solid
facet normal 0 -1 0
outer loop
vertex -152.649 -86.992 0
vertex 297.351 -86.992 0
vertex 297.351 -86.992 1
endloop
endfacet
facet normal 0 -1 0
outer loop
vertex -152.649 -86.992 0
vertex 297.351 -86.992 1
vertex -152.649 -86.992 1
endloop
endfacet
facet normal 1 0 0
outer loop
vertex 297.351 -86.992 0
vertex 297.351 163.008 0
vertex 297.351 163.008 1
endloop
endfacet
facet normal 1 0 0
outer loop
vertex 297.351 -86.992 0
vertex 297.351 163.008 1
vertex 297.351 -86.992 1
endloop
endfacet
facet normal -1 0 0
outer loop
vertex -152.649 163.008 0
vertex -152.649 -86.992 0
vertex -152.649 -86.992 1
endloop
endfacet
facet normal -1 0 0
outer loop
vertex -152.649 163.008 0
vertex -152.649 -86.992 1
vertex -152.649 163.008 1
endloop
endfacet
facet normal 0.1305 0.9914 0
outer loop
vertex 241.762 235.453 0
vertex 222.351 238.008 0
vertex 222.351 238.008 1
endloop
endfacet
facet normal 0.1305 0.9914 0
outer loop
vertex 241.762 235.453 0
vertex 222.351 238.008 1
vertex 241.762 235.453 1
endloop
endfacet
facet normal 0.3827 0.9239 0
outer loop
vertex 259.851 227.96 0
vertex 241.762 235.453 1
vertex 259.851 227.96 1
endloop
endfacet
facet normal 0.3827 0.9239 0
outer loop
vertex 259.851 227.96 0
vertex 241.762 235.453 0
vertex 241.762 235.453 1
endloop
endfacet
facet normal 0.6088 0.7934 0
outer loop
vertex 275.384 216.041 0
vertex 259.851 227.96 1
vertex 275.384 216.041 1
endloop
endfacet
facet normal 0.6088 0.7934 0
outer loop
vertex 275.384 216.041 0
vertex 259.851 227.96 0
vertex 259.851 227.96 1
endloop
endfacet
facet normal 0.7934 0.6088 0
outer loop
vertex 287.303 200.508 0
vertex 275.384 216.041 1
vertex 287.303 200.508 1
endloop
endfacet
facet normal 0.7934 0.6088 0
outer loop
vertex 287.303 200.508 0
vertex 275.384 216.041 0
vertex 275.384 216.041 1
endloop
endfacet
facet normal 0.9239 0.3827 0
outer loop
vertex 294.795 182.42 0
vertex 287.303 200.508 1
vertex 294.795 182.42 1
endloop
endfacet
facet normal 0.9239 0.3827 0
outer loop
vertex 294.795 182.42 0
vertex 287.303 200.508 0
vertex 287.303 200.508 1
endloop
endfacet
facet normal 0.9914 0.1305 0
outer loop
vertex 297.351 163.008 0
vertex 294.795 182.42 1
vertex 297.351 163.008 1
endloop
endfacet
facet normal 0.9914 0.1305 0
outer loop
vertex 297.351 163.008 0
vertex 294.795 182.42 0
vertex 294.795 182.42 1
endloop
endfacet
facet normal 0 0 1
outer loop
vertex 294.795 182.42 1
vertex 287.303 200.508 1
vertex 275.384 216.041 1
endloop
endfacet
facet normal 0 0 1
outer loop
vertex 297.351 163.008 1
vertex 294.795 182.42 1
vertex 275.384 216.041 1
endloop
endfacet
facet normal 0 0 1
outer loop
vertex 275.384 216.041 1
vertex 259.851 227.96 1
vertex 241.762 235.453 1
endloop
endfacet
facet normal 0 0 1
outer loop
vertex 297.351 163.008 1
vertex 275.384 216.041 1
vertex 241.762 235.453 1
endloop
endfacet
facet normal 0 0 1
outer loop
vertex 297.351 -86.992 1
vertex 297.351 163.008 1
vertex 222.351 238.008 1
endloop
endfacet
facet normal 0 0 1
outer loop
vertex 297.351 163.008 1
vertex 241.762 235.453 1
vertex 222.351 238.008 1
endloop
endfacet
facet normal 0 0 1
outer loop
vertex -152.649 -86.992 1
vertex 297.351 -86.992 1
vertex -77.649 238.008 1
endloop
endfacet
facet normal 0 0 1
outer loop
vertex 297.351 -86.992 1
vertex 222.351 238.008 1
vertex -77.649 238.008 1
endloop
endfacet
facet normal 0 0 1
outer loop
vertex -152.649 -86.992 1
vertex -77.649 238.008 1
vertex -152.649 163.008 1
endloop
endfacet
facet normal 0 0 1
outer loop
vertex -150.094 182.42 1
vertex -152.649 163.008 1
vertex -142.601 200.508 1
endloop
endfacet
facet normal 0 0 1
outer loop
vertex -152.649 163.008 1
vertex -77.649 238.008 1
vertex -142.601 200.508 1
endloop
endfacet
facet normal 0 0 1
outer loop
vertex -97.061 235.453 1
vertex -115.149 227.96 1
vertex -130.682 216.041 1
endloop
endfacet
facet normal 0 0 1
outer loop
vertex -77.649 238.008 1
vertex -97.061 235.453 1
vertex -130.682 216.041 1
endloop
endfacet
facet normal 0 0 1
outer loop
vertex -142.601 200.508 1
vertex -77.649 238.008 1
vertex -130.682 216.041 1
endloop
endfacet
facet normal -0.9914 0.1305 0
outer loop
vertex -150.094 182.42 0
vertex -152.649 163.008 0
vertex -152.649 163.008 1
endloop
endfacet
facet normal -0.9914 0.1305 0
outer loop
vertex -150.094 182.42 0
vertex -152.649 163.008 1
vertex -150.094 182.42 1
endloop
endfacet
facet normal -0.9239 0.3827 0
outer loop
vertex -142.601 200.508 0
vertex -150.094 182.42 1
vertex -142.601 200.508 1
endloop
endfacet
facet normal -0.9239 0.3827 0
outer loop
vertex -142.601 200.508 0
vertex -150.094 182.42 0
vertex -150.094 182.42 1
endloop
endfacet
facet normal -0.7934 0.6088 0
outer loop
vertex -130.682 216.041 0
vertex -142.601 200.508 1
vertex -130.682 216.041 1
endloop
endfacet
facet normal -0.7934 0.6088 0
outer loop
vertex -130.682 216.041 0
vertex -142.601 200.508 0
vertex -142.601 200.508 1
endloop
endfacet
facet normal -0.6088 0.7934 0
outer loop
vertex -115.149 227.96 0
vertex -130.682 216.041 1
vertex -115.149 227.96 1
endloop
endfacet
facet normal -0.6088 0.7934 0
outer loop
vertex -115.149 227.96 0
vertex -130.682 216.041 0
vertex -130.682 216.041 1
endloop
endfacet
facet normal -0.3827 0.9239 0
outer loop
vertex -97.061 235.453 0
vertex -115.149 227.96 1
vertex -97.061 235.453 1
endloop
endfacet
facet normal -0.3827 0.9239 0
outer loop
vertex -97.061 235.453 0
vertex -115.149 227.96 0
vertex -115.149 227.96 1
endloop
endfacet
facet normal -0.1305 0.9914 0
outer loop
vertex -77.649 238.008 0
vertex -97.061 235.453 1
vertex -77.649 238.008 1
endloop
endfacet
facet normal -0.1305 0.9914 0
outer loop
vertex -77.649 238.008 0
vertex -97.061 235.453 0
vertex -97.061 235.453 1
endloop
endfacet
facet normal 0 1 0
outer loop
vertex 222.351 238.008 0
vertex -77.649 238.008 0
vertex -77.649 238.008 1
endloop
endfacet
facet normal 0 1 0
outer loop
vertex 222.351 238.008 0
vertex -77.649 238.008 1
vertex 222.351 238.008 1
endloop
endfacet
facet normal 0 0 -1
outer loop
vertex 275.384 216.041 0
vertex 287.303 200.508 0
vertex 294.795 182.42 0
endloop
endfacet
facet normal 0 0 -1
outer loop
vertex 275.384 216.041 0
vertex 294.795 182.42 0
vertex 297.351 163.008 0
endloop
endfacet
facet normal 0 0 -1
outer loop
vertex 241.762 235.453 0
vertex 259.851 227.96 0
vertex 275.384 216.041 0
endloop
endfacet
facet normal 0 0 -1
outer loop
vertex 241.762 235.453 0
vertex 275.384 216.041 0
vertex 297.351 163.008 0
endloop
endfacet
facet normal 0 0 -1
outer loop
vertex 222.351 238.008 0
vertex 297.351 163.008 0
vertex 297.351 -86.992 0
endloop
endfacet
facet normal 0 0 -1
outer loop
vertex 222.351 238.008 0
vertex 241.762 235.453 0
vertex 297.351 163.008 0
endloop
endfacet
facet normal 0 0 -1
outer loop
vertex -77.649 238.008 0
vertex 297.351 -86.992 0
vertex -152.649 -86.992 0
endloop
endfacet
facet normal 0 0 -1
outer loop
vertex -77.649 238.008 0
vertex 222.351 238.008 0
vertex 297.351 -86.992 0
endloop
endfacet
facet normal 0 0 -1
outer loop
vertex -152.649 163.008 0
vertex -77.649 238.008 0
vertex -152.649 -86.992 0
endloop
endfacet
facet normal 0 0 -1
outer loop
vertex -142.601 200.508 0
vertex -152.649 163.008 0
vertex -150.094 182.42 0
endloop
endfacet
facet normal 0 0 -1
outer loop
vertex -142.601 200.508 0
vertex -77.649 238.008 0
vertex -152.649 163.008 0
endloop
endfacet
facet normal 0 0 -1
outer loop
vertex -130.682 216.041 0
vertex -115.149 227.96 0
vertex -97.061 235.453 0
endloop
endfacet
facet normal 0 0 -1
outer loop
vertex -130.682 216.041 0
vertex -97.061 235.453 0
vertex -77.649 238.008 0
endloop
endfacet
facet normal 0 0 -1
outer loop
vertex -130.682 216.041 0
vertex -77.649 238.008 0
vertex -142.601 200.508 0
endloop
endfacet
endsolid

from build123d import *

# Parameters (mm, degrees)
EXTRUDE_2_DEPTH = 1


with BuildPart() as part:
    # Эскиз1 → Бобышка-Вытянуть2 (new body)
    with BuildSketch(Plane.XY):
        with BuildLine():
            Line((-152.649098001, -86.991869919), (-152.649098001, 163.008130081))
            ThreePointArc((-152.649098001, 163.008130081), (-130.68210659, 216.04113867), (-77.649098001, 238.008130081))
            Line((-77.649098001, 238.008130081), (222.350901999, 238.008130081))
            ThreePointArc((222.350901999, 238.008130081), (275.383910588, 216.04113867), (297.350901999, 163.008130081))
            Line((297.350901999, 163.008130081), (297.350901999, -86.991869919))
            Line((297.350901999, -86.991869919), (272.350901999, -86.991869919))
            Line((272.350901999, -86.991869919), (-152.649098001, -86.991869919))
        make_face()
    extrude(amount=EXTRUDE_2_DEPTH)


solid = part.part
